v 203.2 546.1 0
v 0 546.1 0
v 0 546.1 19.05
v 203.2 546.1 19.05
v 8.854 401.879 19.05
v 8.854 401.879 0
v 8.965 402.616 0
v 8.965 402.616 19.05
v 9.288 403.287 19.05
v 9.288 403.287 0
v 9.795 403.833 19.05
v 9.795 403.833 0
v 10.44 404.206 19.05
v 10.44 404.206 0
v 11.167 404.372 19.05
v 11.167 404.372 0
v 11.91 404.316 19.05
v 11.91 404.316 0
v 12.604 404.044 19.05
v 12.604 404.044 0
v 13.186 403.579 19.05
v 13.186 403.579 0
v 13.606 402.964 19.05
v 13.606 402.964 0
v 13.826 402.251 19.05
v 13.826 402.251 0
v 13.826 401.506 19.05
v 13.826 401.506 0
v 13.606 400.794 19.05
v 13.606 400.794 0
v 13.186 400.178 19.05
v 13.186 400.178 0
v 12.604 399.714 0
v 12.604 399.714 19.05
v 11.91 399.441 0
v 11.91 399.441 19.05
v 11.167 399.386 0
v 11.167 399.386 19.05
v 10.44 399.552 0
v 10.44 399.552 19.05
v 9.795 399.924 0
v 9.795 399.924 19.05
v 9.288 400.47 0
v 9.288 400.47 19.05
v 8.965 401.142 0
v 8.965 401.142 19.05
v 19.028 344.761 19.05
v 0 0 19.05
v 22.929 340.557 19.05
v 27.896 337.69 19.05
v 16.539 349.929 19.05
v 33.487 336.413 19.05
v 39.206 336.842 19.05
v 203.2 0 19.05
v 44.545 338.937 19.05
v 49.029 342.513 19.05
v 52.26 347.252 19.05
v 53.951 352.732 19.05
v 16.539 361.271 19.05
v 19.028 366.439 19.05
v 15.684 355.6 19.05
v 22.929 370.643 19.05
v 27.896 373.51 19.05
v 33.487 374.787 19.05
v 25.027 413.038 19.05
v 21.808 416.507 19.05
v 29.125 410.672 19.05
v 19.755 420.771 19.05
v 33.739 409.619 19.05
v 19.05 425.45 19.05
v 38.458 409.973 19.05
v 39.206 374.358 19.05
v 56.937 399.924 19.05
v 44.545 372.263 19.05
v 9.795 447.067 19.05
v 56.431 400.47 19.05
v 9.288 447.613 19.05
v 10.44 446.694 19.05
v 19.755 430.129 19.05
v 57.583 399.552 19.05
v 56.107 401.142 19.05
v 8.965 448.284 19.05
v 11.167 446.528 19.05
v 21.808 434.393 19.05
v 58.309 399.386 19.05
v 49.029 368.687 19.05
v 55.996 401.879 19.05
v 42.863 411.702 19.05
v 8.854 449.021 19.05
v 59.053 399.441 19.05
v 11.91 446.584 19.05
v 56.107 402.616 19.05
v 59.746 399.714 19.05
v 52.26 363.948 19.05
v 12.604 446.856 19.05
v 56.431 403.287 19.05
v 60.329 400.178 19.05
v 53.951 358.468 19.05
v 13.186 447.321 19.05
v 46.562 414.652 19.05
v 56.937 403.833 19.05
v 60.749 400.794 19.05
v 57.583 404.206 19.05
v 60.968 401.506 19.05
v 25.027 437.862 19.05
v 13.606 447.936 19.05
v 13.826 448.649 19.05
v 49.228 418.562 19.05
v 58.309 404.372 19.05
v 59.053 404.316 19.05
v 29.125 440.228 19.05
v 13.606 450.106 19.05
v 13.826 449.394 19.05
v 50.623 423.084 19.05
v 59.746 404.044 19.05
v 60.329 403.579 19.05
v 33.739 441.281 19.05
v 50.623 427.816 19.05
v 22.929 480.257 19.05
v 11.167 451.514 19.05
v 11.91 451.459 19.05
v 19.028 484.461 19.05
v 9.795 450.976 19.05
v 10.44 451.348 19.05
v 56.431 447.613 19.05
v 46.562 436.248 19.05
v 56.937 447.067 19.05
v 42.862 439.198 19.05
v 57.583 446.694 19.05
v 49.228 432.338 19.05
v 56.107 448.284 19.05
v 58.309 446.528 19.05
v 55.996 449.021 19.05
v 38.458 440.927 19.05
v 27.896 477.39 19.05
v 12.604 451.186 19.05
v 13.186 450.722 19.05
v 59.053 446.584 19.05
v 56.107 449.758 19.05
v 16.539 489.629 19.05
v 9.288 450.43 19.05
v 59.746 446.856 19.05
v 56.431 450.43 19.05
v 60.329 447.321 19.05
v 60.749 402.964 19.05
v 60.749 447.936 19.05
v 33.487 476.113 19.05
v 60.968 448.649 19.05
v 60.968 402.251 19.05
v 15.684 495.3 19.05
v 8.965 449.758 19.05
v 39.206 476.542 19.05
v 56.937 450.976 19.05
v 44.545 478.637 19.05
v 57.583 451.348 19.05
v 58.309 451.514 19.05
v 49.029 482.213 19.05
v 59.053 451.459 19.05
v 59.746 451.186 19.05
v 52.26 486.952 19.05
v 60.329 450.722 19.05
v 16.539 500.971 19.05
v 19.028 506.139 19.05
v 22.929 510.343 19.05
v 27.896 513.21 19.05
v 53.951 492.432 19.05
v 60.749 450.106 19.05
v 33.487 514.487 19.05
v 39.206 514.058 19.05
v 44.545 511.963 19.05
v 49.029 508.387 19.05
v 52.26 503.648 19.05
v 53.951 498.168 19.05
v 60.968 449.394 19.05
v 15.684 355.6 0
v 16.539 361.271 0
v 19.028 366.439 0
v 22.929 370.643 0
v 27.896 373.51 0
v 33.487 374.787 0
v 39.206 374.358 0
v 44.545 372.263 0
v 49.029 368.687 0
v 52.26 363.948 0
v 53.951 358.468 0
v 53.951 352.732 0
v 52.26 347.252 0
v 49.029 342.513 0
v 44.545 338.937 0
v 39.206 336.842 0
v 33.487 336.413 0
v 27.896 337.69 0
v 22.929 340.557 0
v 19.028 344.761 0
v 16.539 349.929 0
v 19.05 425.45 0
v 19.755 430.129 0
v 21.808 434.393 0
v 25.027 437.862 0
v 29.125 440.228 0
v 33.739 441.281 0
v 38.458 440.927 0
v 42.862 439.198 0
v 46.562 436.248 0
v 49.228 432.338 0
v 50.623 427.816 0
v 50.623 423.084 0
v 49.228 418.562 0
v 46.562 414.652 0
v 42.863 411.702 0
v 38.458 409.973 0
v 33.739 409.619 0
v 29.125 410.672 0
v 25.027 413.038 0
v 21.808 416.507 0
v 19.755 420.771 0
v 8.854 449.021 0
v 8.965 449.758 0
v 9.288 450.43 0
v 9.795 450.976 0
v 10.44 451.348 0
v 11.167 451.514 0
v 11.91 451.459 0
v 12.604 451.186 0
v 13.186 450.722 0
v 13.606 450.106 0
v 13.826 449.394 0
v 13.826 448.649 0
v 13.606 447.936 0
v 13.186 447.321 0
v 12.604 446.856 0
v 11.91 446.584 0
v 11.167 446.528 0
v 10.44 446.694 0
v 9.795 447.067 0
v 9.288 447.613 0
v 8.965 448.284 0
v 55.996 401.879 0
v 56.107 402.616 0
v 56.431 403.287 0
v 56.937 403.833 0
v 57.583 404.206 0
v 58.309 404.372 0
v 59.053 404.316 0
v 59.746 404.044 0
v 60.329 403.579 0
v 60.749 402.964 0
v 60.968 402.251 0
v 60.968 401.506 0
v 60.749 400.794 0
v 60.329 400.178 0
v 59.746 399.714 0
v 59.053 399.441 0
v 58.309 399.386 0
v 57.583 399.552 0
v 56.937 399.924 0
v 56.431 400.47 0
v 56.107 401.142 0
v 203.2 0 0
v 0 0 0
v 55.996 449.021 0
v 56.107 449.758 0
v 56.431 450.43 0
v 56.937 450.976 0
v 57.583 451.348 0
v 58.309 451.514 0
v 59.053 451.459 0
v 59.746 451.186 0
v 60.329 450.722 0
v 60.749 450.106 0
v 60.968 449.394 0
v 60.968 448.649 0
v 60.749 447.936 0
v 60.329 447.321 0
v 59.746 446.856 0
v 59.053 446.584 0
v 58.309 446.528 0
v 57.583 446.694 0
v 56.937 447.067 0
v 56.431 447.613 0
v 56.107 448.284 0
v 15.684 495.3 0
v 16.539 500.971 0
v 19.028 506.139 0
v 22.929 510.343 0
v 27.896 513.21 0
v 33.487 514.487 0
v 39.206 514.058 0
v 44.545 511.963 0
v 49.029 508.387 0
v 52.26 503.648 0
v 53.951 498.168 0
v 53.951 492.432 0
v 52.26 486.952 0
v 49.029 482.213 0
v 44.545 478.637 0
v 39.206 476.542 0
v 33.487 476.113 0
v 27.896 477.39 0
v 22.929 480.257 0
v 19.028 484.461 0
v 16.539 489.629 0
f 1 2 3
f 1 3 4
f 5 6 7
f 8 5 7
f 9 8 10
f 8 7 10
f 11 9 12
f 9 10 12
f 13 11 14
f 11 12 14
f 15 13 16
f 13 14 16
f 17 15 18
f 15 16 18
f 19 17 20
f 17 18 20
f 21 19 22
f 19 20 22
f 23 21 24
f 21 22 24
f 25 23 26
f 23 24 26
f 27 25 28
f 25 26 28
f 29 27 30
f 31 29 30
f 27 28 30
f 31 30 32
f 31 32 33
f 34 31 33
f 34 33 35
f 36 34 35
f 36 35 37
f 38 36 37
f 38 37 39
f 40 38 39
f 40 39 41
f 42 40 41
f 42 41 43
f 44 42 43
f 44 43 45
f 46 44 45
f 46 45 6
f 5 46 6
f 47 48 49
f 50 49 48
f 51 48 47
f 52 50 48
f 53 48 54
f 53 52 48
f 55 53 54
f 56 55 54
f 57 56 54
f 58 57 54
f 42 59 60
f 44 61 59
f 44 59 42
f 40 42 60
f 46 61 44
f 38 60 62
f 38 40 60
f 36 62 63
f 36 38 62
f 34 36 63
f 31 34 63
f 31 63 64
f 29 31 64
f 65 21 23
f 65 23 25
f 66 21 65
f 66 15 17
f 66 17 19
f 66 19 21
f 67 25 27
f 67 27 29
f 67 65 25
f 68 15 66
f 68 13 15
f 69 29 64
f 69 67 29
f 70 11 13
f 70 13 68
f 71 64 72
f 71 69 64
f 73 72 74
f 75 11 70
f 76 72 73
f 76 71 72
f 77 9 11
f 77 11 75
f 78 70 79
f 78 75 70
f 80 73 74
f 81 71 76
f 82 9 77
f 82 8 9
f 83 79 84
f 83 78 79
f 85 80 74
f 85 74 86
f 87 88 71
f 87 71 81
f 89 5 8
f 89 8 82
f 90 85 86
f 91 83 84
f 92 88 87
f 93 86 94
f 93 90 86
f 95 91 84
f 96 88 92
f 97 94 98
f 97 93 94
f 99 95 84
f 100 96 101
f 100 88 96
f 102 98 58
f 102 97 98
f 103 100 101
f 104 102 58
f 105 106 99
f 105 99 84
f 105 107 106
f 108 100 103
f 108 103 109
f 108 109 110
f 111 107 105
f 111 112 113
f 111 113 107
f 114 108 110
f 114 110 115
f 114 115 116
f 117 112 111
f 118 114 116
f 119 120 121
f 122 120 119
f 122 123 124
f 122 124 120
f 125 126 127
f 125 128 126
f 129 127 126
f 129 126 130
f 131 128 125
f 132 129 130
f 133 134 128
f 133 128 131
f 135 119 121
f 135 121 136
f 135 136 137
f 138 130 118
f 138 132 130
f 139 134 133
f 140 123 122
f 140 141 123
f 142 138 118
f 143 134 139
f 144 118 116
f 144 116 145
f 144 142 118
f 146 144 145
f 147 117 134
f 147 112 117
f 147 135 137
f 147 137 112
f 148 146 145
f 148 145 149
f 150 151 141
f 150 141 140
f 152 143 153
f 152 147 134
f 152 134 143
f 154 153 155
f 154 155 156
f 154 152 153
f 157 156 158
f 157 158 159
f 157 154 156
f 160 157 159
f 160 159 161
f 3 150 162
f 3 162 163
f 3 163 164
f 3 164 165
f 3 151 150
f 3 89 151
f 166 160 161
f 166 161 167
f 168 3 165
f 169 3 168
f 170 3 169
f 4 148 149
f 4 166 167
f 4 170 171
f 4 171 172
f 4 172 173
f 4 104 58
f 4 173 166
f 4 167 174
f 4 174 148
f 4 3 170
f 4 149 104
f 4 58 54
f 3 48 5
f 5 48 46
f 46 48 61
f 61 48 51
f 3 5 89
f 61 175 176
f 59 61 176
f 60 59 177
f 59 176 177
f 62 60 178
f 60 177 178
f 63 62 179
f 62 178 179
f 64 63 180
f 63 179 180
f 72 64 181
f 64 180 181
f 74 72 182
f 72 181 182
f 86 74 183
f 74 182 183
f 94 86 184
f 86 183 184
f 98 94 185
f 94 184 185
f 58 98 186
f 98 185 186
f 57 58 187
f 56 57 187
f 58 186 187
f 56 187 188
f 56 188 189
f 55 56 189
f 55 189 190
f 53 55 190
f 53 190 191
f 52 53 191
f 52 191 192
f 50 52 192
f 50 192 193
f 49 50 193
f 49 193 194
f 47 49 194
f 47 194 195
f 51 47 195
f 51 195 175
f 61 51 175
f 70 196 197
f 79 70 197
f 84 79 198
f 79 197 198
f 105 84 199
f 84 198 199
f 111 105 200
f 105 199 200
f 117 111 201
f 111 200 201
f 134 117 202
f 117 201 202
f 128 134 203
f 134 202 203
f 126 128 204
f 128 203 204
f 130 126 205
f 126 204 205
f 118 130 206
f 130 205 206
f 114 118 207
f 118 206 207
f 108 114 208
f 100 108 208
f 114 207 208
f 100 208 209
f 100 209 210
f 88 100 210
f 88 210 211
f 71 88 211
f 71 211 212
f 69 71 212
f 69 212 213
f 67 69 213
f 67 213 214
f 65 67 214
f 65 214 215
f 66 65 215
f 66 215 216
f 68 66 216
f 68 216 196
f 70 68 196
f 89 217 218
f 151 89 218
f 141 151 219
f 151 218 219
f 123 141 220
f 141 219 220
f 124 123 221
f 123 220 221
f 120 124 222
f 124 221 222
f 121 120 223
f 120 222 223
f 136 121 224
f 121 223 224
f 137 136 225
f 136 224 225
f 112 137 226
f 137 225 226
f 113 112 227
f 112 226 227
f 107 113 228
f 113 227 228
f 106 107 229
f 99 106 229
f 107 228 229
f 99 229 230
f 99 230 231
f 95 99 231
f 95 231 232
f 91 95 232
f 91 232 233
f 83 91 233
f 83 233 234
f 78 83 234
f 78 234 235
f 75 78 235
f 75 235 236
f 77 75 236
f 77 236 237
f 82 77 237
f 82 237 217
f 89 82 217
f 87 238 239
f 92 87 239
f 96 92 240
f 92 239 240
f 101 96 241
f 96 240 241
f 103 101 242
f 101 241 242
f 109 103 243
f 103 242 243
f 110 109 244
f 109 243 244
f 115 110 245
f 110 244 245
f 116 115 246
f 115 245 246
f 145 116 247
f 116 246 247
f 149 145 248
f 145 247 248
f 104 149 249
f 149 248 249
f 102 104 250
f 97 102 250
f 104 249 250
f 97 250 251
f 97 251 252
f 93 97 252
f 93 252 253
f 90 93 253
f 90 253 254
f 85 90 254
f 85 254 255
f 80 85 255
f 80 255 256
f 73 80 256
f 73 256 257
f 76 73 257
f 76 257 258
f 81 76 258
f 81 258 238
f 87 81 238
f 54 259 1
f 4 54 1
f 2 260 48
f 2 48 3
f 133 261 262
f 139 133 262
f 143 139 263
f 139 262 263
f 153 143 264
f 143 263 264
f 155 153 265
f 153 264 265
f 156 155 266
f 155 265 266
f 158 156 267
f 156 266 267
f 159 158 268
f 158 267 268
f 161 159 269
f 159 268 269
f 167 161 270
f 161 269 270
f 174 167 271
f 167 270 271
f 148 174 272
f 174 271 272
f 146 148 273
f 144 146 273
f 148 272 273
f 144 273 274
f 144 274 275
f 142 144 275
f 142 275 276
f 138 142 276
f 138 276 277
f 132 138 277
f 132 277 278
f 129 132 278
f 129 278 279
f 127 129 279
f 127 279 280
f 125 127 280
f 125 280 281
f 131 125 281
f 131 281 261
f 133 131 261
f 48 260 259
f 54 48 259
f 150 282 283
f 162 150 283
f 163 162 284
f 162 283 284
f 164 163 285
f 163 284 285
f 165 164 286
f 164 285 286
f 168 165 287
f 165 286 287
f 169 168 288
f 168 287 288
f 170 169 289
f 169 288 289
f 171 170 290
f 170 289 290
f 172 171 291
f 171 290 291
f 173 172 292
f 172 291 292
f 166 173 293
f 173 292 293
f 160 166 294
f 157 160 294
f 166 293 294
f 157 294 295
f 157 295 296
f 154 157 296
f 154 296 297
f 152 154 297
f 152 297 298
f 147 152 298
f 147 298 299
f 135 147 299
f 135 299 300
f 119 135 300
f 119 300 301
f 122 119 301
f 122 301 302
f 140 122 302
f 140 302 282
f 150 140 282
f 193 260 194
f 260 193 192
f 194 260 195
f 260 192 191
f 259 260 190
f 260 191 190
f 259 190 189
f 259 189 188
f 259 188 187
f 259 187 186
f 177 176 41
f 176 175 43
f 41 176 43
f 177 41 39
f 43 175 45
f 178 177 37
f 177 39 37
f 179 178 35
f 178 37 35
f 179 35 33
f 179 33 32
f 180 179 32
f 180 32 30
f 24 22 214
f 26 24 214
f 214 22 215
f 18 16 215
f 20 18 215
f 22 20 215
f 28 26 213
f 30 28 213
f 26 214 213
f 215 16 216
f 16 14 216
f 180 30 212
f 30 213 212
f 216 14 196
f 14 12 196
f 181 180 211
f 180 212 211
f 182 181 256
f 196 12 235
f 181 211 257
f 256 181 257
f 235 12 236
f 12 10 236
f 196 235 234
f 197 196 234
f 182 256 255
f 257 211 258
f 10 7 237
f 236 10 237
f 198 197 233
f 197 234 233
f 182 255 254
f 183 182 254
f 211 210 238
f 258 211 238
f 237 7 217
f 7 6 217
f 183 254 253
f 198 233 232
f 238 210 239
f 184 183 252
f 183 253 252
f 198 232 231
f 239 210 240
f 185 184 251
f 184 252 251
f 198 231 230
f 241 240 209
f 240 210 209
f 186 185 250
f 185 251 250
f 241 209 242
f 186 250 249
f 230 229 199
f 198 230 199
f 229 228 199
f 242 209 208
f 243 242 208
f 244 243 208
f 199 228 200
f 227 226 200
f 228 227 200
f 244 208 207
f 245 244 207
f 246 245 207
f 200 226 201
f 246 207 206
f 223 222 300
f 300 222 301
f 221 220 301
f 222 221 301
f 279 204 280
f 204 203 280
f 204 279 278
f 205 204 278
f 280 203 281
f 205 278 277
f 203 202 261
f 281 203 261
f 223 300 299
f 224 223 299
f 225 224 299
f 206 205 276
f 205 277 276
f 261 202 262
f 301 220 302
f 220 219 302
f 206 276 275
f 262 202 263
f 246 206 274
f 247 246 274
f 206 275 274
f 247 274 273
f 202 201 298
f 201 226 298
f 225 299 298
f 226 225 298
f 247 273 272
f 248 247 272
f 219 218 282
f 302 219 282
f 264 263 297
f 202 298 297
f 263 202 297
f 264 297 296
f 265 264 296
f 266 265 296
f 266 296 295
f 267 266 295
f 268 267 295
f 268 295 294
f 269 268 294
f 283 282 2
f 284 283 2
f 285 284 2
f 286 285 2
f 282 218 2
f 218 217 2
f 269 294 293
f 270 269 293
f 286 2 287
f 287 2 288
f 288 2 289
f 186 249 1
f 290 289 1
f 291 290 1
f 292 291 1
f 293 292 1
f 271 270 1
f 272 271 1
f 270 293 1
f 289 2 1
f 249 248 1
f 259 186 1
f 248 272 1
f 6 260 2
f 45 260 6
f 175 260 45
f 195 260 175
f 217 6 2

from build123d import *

# Parameters (mm, degrees)
SKETCH1_W               = 203.2
SKETCH1_H               = 546.1
BOSS_EXTRUDE1_DEPTH     = 19.05
SKETCH2_R               = 19.2405
CUT_EXTRUDE1_DEPTH      = 583.990868282
ENL_V_MAT_EXTRU_1_REACH = 584.991
ESQUISSE1_R             = 15.875
ESQUISSE1_R_2           = 2.5


with BuildPart() as part:
    # Sketch1 → Boss-Extrude1 (new body)
    with BuildSketch(Plane.XY):
        with Locations((101.6, 273.05)):
            Rectangle(SKETCH1_W, SKETCH1_H)
    extrude(amount=BOSS_EXTRUDE1_DEPTH)

    # Sketch2 → Cut-Extrude1 (cut, through all)
    with BuildSketch(Plane(origin=(0, 0, 0), x_dir=(-1, 0, 0), z_dir=(0, 0, -1))):
        with Locations((-34.925, 495.3)):
            Circle(SKETCH2_R)
        with Locations((-34.925, 355.6)):
            Circle(SKETCH2_R)
    extrude(amount=-CUT_EXTRUDE1_DEPTH, mode=Mode.SUBTRACT)

    # Esquisse1 → Enlèv. mat.-Extru.1 (cut, up to next)
    with BuildSketch(Plane(origin=(0, 0, 0), x_dir=(-1, 0, 0), z_dir=(0, 0, -1)), mode=Mode.PRIVATE) as enl_v_mat_extru_1_sk1:
        with Locations((-34.925, 425.45)):
            Circle(ESQUISSE1_R)
    enl_v_mat_extru_1_tool1 = extrude(enl_v_mat_extru_1_sk1.sketch, amount=-ENL_V_MAT_EXTRU_1_REACH, mode=Mode.PRIVATE) & part.part
    # Esquisse1 → Enlèv. mat.-Extru.1 (cut, up to next)
    with BuildSketch(Plane(origin=(0, 0, 0), x_dir=(-1, 0, 0), z_dir=(0, 0, -1)), mode=Mode.PRIVATE) as enl_v_mat_extru_1_sk2:
        with Locations((-58.4962, 449.0212)):
            Circle(ESQUISSE1_R_2)
    enl_v_mat_extru_1_tool2 = extrude(enl_v_mat_extru_1_sk2.sketch, amount=-ENL_V_MAT_EXTRU_1_REACH, mode=Mode.PRIVATE) & part.part
    # Esquisse1 → Enlèv. mat.-Extru.1 (cut, up to next)
    with BuildSketch(Plane(origin=(0, 0, 0), x_dir=(-1, 0, 0), z_dir=(0, 0, -1)), mode=Mode.PRIVATE) as enl_v_mat_extru_1_sk3:
        with Locations((-11.3538, 449.0212)):
            Circle(ESQUISSE1_R_2)
    enl_v_mat_extru_1_tool3 = extrude(enl_v_mat_extru_1_sk3.sketch, amount=-ENL_V_MAT_EXTRU_1_REACH, mode=Mode.PRIVATE) & part.part
    # Esquisse1 → Enlèv. mat.-Extru.1 (cut, up to next)
    with BuildSketch(Plane(origin=(0, 0, 0), x_dir=(-1, 0, 0), z_dir=(0, 0, -1)), mode=Mode.PRIVATE) as enl_v_mat_extru_1_sk4:
        with Locations((-11.3538, 401.8788)):
            Circle(ESQUISSE1_R_2)
    enl_v_mat_extru_1_tool4 = extrude(enl_v_mat_extru_1_sk4.sketch, amount=-ENL_V_MAT_EXTRU_1_REACH, mode=Mode.PRIVATE) & part.part
    # Esquisse1 → Enlèv. mat.-Extru.1 (cut, up to next)
    with BuildSketch(Plane(origin=(0, 0, 0), x_dir=(-1, 0, 0), z_dir=(0, 0, -1)), mode=Mode.PRIVATE) as enl_v_mat_extru_1_sk5:
        with Locations((-58.4962, 401.8788)):
            Circle(ESQUISSE1_R_2)
    enl_v_mat_extru_1_tool5 = extrude(enl_v_mat_extru_1_sk5.sketch, amount=-ENL_V_MAT_EXTRU_1_REACH, mode=Mode.PRIVATE) & part.part
    add(enl_v_mat_extru_1_tool1.solids().sort_by_distance((34.925, 425.45, 0))[0], mode=Mode.SUBTRACT)
    add(enl_v_mat_extru_1_tool2.solids().sort_by_distance((58.4962, 449.0212, 0))[0], mode=Mode.SUBTRACT)
    add(enl_v_mat_extru_1_tool3.solids().sort_by_distance((11.3538, 449.0212, 0))[0], mode=Mode.SUBTRACT)
    add(enl_v_mat_extru_1_tool4.solids().sort_by_distance((11.3538, 401.8788, 0))[0], mode=Mode.SUBTRACT)
    add(enl_v_mat_extru_1_tool5.solids().sort_by_distance((58.4962, 401.8788, 0))[0], mode=Mode.SUBTRACT)


solid = part.part
